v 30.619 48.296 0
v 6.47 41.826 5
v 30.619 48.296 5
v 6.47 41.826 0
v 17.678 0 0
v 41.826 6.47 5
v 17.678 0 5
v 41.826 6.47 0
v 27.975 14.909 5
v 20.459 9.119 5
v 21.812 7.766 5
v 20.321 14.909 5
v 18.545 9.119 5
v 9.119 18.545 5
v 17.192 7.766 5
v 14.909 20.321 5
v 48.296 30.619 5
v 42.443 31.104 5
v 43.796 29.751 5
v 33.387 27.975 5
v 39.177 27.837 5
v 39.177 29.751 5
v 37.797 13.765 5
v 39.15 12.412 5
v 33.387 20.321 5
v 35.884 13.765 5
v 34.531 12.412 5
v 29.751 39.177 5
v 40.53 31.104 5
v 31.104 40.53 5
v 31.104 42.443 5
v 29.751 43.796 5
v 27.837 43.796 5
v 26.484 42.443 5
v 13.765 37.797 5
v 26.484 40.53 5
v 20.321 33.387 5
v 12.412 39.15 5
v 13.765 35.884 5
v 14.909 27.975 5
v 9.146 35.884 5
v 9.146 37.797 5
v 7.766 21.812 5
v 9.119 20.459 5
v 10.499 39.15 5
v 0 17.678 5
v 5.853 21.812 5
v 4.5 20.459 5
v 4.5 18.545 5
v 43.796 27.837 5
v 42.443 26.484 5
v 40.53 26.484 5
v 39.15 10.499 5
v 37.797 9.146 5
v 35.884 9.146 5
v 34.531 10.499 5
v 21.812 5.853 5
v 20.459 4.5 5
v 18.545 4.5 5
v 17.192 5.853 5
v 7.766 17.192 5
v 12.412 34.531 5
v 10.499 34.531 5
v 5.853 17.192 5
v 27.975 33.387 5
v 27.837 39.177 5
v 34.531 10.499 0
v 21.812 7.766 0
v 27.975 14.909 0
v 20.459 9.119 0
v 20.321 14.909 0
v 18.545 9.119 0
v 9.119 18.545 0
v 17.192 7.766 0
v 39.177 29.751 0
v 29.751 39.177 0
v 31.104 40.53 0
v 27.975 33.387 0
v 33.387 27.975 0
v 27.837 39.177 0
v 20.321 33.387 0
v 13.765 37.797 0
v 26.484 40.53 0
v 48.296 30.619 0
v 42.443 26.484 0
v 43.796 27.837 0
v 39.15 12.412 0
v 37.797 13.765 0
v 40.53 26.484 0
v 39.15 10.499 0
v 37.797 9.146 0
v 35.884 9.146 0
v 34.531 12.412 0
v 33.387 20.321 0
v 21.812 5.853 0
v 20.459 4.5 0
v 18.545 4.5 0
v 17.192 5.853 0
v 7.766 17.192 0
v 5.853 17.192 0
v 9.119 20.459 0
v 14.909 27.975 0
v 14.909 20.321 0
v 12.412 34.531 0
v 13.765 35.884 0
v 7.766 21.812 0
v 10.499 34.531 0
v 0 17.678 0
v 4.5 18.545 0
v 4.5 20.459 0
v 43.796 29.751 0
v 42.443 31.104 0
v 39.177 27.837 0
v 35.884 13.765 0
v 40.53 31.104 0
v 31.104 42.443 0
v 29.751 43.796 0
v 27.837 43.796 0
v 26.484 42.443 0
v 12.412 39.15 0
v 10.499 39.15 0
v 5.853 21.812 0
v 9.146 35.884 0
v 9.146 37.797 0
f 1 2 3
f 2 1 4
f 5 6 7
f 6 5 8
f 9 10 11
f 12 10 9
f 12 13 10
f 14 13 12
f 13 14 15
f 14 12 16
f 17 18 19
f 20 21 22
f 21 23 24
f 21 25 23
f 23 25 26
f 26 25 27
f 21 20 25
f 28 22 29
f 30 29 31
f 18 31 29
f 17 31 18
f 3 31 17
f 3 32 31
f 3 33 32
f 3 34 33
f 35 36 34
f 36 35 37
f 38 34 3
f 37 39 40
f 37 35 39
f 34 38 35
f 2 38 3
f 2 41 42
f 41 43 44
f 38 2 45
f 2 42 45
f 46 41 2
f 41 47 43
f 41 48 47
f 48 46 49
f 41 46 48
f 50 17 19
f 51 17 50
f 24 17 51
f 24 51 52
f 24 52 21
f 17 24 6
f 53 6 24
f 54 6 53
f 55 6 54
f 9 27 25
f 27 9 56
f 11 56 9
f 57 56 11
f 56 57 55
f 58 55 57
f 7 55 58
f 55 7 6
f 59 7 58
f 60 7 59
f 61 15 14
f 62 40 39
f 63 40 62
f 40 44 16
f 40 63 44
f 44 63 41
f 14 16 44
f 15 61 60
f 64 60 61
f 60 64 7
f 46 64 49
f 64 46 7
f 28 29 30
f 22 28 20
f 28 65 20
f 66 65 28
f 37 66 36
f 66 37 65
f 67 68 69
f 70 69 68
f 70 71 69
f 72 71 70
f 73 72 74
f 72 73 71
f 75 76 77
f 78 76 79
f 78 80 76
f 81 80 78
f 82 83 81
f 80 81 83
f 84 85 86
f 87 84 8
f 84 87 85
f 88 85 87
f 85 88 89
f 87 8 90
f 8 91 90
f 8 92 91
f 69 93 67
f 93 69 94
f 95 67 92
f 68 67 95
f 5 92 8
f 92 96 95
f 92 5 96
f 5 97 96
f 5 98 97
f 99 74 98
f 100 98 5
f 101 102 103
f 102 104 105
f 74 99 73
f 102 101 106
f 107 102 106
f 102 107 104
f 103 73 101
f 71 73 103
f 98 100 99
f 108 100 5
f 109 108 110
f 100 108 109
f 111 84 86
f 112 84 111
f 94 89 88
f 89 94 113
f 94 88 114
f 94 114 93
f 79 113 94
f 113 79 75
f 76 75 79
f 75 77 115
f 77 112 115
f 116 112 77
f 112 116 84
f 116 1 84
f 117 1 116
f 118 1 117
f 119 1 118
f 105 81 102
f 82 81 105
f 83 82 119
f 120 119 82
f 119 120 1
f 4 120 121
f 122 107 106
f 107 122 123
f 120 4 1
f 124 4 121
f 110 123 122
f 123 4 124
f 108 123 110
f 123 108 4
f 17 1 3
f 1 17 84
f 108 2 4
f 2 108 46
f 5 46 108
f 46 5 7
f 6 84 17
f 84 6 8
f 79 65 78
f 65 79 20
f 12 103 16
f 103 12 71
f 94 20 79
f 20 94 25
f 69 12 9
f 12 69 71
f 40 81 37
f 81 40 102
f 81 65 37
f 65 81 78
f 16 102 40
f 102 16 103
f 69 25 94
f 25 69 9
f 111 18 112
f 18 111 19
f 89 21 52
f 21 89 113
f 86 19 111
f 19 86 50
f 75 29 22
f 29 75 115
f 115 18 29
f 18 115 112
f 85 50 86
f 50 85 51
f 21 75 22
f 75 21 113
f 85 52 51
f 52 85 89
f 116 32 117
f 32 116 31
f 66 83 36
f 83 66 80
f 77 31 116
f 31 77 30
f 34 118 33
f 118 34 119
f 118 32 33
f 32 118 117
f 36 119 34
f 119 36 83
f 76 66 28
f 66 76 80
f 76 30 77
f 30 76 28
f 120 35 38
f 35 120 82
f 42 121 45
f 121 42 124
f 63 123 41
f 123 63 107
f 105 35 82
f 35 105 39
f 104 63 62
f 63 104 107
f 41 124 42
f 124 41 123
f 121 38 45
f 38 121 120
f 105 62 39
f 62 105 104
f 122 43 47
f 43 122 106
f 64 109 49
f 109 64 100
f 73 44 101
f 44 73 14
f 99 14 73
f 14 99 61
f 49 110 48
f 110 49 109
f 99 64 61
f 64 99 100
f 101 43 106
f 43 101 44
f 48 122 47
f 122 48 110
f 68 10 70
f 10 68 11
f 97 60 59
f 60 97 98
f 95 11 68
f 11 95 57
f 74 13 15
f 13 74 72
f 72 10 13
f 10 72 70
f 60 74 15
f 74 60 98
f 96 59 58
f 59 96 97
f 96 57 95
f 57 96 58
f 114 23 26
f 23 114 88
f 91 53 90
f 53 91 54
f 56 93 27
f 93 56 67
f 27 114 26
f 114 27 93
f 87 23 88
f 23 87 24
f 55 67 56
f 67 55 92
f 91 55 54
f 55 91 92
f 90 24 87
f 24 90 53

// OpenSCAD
$fn = 32;

// ----------------------------------------------------------------------
// Polygon plate: 6-gon R25, 6 bolt windows
// ----------------------------------------------------------------------

// --- parameters (mm) ---
sides = 6;                // number of polygon sides
plate_r = 25;             // circumscribed radius of the polygon
bore_r = 10;              // centre bore radius
bolts = 6;                // number of bolt windows
ring_r = 17.95;           // bolt-circle radius
bolt_r = 2.5;             // bolt window radius
plate_t = 5;              // plate thickness, Z (extrusion height)

plate_d = 2 * plate_r;  // circumscribed diameter
bore_d = 2 * bore_r;  // centre bore diameter
bolt_d = 2 * bolt_r;  // bolt window diameter
ring_d = 2 * ring_r;  // bolt-circle diameter

profile = [[48.296, 30.619], [30.619, 48.296], [6.47, 41.826], [0, 17.678], [17.678, 0], [41.826, 6.47]];  // primary outline, 6 points, counter clockwise
void_1 = [[33.387, 27.975], [27.975, 33.387], [20.321, 33.387], [14.909, 27.975], [14.909, 20.321], [20.321, 14.909], [27.975, 14.909], [33.387, 20.321]];  // centre bore, 8 points
void_2 = [[43.796, 29.751], [42.443, 31.104], [40.53, 31.104], [39.177, 29.751], [39.177, 27.837], [40.53, 26.484], [42.443, 26.484], [43.796, 27.837]];  // bolt window 1, 8 points
void_3 = [[31.104, 42.443], [29.751, 43.796], [27.837, 43.796], [26.484, 42.443], [26.484, 40.53], [27.837, 39.177], [29.751, 39.177], [31.104, 40.53]];  // bolt window 2, 8 points
void_4 = [[13.765, 37.797], [12.412, 39.15], [10.499, 39.15], [9.146, 37.797], [9.146, 35.884], [10.499, 34.531], [12.412, 34.531], [13.765, 35.884]];  // bolt window 3, 8 points
void_5 = [[9.119, 20.459], [7.766, 21.812], [5.853, 21.812], [4.5, 20.459], [4.5, 18.545], [5.853, 17.192], [7.766, 17.192], [9.119, 18.545]];  // bolt window 4, 8 points
void_6 = [[21.812, 7.766], [20.459, 9.119], [18.545, 9.119], [17.192, 7.766], [17.192, 5.853], [18.545, 4.5], [20.459, 4.5], [21.812, 5.853]];  // bolt window 5, 8 points
void_7 = [[39.15, 12.412], [37.797, 13.765], [35.884, 13.765], [34.531, 12.412], [34.531, 10.499], [35.884, 9.146], [37.797, 9.146], [39.15, 10.499]];  // bolt window 6, 8 points

// --- the one profile operation ---
difference() {
  linear_extrude(height = plate_t) polygon(points = profile);
  translate([0, 0, -1])
    linear_extrude(height = plate_t + 2) polygon(points = void_1);
  translate([0, 0, -1])
    linear_extrude(height = plate_t + 2) polygon(points = void_2);
  translate([0, 0, -1])
    linear_extrude(height = plate_t + 2) polygon(points = void_3);
  translate([0, 0, -1])
    linear_extrude(height = plate_t + 2) polygon(points = void_4);
  translate([0, 0, -1])
    linear_extrude(height = plate_t + 2) polygon(points = void_5);
  translate([0, 0, -1])
    linear_extrude(height = plate_t + 2) polygon(points = void_6);
  translate([0, 0, -1])
    linear_extrude(height = plate_t + 2) polygon(points = void_7);
}
